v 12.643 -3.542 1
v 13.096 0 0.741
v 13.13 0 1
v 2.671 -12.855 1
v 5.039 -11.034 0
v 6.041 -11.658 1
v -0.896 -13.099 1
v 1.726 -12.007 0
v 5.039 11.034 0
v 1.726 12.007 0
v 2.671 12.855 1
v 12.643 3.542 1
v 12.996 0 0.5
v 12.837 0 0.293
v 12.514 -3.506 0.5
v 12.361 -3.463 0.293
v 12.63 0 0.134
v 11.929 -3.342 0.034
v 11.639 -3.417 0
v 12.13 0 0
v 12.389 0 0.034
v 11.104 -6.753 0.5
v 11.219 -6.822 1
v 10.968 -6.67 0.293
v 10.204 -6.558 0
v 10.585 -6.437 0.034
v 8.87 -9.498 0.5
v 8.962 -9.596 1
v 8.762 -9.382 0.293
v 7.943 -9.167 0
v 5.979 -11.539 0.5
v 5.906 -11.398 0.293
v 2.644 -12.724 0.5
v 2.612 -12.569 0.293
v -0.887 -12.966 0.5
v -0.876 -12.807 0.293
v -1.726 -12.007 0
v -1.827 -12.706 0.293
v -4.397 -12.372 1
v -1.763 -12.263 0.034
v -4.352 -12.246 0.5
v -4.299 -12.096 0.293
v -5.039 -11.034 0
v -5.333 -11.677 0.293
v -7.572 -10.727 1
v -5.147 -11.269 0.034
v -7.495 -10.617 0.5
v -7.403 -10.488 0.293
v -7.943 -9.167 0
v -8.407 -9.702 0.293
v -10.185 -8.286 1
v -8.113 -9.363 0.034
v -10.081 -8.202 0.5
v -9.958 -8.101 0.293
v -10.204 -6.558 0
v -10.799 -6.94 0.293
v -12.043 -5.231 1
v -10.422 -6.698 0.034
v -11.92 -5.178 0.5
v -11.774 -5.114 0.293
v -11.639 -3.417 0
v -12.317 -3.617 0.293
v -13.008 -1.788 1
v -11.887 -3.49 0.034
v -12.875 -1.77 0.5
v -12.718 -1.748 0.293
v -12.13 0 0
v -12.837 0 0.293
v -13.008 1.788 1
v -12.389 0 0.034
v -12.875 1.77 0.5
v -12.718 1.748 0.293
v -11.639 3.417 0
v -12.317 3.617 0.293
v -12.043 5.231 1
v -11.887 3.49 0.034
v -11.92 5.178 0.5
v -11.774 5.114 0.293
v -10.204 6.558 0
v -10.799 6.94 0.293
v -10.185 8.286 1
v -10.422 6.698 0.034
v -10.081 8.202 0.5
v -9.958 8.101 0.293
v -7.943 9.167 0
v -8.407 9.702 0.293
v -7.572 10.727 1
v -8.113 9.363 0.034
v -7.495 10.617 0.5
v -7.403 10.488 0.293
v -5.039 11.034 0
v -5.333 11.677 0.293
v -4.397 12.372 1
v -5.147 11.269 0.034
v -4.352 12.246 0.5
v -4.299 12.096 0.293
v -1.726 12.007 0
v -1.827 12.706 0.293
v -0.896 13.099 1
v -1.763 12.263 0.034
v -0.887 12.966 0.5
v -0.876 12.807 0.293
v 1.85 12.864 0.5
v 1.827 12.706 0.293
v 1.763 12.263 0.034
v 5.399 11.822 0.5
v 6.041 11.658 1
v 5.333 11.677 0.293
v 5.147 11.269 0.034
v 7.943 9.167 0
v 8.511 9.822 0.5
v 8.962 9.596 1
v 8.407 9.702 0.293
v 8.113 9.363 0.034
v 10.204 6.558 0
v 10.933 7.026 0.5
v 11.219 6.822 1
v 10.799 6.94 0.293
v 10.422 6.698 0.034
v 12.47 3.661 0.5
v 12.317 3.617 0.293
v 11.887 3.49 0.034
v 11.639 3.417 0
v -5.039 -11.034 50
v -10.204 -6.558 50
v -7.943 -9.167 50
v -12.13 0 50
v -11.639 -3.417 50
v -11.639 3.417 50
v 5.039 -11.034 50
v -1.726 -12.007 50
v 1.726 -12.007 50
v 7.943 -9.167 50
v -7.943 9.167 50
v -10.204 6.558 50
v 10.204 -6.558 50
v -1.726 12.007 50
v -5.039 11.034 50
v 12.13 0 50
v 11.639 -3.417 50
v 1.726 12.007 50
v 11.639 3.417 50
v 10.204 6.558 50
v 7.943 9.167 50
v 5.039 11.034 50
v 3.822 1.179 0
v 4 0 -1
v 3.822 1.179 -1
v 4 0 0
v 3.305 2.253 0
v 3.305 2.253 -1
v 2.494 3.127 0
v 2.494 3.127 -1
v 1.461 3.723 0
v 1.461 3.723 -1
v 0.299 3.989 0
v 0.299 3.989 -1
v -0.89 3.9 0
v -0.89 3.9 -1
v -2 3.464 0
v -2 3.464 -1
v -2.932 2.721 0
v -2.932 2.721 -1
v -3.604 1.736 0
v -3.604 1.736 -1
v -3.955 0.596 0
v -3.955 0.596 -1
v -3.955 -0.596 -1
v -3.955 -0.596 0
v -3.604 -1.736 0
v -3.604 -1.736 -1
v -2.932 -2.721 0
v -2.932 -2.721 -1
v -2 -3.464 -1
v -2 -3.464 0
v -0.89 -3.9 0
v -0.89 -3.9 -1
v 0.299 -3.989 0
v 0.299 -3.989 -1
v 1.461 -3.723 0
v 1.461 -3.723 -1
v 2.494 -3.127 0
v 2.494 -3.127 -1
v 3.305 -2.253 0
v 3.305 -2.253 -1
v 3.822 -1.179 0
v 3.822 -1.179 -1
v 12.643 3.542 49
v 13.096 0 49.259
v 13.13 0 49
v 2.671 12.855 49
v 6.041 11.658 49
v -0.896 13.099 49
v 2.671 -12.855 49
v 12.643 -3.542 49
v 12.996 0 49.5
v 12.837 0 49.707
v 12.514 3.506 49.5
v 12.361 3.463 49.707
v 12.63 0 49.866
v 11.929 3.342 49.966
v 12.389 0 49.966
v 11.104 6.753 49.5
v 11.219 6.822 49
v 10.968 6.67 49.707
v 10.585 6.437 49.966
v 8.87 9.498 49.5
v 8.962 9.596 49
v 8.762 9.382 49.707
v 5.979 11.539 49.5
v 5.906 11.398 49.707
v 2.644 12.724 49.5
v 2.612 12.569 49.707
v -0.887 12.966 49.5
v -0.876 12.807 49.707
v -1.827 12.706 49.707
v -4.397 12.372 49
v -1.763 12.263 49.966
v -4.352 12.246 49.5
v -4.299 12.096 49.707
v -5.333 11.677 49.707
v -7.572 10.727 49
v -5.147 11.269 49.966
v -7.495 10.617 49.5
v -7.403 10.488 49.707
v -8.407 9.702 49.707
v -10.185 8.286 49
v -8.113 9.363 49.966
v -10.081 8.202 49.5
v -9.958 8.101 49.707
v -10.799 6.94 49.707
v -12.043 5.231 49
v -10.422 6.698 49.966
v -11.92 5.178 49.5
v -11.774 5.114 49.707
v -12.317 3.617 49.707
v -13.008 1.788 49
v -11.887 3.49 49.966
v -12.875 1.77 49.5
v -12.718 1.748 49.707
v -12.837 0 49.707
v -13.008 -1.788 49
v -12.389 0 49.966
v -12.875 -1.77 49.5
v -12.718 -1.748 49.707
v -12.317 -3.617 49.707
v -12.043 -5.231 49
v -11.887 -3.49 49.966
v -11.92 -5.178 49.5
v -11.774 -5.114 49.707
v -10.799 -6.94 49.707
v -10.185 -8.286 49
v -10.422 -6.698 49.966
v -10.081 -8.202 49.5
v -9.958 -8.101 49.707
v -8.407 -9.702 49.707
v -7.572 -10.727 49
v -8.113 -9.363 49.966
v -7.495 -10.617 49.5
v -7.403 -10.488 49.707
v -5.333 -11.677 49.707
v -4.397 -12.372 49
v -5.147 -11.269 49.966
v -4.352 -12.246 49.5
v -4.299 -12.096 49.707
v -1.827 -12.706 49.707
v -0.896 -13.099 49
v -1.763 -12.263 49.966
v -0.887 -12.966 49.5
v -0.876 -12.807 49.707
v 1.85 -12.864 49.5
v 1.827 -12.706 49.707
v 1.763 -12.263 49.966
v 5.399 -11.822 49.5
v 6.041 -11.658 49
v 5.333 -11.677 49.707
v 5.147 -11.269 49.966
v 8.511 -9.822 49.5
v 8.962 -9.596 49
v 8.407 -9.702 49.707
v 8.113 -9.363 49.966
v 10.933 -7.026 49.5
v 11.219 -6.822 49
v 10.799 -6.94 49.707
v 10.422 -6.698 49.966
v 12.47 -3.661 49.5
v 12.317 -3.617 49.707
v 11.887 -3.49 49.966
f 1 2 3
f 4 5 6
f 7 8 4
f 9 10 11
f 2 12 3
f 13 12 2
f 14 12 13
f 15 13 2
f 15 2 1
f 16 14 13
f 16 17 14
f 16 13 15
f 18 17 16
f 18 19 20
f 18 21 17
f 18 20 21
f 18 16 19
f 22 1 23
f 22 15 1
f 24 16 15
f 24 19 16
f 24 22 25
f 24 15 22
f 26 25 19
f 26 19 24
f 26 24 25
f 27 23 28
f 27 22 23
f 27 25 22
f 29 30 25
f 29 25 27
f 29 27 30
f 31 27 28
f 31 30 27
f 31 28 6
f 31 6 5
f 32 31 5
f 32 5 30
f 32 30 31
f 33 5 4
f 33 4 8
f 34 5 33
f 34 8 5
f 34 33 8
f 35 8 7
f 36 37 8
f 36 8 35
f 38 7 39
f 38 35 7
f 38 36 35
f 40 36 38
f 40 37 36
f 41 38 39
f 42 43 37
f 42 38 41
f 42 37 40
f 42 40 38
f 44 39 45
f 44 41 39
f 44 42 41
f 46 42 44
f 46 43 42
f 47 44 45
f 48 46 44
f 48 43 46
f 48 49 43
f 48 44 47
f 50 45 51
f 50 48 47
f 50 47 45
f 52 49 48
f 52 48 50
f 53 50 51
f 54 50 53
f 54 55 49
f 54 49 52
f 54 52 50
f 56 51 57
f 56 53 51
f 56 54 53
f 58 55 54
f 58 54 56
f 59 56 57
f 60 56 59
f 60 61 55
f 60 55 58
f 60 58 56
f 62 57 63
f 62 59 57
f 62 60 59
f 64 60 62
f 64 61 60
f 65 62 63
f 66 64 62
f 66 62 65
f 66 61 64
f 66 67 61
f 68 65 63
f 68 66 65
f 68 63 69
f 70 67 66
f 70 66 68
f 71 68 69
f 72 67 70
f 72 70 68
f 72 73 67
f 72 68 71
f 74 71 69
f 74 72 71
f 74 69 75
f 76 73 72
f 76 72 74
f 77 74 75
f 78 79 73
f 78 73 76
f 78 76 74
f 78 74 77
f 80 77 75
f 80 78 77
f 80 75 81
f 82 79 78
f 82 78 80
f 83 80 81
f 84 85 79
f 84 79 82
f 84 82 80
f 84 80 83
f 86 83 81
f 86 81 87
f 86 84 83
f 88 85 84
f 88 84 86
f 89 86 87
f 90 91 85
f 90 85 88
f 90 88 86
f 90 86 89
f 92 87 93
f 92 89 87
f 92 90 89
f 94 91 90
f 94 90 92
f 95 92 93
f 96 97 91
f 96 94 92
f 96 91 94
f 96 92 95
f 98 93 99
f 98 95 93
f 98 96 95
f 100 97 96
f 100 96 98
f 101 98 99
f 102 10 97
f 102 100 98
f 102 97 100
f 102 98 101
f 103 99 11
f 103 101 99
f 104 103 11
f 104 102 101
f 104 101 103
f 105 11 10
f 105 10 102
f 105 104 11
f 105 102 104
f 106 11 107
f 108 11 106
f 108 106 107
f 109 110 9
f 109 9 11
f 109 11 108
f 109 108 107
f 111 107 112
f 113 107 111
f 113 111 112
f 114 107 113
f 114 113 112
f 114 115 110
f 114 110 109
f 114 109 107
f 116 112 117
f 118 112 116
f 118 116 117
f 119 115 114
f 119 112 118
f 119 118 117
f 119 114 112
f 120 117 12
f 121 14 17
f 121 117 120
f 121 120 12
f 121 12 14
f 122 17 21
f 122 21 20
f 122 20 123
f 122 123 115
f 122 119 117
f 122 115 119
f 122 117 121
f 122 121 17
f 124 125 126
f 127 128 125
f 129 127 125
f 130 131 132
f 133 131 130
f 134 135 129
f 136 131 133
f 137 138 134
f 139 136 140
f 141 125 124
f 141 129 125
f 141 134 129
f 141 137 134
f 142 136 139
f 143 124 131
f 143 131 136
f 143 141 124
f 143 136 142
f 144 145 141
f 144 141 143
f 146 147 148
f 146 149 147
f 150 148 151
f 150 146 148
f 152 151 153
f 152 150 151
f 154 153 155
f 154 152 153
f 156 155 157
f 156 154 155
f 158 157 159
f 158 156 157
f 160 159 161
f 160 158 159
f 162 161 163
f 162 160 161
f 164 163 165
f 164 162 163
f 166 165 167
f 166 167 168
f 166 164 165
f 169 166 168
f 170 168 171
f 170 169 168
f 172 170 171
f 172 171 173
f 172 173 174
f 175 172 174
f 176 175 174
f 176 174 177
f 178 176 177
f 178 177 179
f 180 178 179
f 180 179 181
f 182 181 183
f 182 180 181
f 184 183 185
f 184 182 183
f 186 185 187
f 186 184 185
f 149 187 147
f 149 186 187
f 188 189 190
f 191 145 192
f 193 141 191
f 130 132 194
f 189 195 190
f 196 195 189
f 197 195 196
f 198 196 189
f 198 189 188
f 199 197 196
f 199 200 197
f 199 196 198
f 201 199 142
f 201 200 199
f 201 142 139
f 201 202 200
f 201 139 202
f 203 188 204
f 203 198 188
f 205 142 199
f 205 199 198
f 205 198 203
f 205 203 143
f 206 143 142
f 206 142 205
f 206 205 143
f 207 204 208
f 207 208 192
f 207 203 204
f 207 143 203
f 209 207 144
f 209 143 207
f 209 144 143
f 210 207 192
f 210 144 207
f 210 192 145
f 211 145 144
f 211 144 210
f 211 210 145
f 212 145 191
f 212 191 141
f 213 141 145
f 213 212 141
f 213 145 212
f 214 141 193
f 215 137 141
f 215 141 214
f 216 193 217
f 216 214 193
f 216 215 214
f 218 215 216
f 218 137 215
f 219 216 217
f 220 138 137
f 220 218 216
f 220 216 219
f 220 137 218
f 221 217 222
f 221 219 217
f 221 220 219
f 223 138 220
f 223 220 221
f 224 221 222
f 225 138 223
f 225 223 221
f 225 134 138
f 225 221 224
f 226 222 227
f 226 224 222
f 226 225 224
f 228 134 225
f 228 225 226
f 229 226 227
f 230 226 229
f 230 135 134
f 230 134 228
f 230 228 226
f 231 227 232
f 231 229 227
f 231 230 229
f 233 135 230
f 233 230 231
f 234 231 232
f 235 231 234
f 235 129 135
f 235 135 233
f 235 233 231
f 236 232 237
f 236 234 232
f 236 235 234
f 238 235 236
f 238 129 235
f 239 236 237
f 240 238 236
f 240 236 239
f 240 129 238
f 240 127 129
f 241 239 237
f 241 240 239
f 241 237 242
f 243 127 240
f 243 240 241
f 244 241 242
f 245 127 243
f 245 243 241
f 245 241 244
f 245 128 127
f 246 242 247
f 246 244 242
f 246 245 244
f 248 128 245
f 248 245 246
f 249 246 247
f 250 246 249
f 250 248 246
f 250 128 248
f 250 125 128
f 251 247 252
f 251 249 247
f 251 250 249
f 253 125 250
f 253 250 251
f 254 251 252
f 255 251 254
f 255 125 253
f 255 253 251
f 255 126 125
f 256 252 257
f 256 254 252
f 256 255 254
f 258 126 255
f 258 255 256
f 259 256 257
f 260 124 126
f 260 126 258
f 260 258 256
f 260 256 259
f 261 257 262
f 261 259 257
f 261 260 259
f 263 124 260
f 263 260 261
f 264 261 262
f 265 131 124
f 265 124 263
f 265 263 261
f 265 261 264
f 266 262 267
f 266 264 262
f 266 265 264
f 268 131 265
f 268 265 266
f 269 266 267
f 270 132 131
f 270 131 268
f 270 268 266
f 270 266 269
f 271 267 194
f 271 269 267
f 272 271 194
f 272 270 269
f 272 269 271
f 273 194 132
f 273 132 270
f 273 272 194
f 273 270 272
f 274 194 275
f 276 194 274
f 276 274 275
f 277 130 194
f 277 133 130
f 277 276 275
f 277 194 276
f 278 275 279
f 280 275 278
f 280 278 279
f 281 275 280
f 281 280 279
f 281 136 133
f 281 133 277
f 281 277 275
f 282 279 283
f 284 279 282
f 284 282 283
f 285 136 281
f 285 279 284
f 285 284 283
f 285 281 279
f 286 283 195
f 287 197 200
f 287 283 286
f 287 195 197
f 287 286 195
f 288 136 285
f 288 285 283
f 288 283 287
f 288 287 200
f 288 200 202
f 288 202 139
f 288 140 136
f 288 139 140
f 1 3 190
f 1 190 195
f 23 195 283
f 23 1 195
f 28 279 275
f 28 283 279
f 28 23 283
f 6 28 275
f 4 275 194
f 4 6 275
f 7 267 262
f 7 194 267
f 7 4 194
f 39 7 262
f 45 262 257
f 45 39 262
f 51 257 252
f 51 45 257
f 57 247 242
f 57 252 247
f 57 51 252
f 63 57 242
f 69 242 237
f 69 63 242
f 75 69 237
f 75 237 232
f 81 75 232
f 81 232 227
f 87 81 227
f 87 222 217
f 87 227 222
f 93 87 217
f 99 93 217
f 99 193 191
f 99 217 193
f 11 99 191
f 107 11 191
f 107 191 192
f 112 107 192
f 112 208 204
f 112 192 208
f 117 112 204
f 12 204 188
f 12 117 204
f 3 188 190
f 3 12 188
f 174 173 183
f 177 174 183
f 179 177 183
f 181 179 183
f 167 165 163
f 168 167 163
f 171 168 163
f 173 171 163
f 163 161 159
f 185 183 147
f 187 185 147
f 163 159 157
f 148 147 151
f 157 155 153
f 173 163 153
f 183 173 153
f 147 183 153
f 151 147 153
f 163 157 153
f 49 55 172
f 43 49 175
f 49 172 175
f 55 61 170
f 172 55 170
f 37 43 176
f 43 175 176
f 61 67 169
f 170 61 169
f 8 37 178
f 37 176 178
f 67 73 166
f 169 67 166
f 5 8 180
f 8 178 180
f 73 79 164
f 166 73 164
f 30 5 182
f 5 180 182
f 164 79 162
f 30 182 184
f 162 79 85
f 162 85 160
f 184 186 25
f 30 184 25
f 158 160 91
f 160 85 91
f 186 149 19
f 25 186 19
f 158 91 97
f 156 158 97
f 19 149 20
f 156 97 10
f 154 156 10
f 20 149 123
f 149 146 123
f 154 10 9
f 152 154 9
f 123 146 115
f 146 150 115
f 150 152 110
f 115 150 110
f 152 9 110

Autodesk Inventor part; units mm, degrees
ref_plane "YZ Plane" through (0, 0, 0) normal (1, 0, 0) x (0, 1, 0)
ref_plane "XZ Plane" through (0, 0, 0) normal (0, 1, 0) x (-1, 0, 0)
ref_plane "XY Plane" through (0, 0, 0) normal (0, 0, 1) x (1, 0, 0)
sketch "Skizze1" plane through (0, 0, 0) normal (0, 0, 1) x (1, 0, 0)
  circle A0 centre (0, 0) radius 13.13
  circle A1 centre (0, 0) radius 4
  dimension "d0" = 26.26
  dimension "d3" = 8
extrude "Extrusion1" add sketch "Skizze1" along normal blind 50 contours A0 | A1
extrude "Extrusion2" add sketch "Skizze1" against normal blind 1 contours A1
fillet "Rundung1" radius 1 2 edges at (-13.13, 0, 0) (-13.13, 0, 50)
properties part number "LG INR18650MJ1"
